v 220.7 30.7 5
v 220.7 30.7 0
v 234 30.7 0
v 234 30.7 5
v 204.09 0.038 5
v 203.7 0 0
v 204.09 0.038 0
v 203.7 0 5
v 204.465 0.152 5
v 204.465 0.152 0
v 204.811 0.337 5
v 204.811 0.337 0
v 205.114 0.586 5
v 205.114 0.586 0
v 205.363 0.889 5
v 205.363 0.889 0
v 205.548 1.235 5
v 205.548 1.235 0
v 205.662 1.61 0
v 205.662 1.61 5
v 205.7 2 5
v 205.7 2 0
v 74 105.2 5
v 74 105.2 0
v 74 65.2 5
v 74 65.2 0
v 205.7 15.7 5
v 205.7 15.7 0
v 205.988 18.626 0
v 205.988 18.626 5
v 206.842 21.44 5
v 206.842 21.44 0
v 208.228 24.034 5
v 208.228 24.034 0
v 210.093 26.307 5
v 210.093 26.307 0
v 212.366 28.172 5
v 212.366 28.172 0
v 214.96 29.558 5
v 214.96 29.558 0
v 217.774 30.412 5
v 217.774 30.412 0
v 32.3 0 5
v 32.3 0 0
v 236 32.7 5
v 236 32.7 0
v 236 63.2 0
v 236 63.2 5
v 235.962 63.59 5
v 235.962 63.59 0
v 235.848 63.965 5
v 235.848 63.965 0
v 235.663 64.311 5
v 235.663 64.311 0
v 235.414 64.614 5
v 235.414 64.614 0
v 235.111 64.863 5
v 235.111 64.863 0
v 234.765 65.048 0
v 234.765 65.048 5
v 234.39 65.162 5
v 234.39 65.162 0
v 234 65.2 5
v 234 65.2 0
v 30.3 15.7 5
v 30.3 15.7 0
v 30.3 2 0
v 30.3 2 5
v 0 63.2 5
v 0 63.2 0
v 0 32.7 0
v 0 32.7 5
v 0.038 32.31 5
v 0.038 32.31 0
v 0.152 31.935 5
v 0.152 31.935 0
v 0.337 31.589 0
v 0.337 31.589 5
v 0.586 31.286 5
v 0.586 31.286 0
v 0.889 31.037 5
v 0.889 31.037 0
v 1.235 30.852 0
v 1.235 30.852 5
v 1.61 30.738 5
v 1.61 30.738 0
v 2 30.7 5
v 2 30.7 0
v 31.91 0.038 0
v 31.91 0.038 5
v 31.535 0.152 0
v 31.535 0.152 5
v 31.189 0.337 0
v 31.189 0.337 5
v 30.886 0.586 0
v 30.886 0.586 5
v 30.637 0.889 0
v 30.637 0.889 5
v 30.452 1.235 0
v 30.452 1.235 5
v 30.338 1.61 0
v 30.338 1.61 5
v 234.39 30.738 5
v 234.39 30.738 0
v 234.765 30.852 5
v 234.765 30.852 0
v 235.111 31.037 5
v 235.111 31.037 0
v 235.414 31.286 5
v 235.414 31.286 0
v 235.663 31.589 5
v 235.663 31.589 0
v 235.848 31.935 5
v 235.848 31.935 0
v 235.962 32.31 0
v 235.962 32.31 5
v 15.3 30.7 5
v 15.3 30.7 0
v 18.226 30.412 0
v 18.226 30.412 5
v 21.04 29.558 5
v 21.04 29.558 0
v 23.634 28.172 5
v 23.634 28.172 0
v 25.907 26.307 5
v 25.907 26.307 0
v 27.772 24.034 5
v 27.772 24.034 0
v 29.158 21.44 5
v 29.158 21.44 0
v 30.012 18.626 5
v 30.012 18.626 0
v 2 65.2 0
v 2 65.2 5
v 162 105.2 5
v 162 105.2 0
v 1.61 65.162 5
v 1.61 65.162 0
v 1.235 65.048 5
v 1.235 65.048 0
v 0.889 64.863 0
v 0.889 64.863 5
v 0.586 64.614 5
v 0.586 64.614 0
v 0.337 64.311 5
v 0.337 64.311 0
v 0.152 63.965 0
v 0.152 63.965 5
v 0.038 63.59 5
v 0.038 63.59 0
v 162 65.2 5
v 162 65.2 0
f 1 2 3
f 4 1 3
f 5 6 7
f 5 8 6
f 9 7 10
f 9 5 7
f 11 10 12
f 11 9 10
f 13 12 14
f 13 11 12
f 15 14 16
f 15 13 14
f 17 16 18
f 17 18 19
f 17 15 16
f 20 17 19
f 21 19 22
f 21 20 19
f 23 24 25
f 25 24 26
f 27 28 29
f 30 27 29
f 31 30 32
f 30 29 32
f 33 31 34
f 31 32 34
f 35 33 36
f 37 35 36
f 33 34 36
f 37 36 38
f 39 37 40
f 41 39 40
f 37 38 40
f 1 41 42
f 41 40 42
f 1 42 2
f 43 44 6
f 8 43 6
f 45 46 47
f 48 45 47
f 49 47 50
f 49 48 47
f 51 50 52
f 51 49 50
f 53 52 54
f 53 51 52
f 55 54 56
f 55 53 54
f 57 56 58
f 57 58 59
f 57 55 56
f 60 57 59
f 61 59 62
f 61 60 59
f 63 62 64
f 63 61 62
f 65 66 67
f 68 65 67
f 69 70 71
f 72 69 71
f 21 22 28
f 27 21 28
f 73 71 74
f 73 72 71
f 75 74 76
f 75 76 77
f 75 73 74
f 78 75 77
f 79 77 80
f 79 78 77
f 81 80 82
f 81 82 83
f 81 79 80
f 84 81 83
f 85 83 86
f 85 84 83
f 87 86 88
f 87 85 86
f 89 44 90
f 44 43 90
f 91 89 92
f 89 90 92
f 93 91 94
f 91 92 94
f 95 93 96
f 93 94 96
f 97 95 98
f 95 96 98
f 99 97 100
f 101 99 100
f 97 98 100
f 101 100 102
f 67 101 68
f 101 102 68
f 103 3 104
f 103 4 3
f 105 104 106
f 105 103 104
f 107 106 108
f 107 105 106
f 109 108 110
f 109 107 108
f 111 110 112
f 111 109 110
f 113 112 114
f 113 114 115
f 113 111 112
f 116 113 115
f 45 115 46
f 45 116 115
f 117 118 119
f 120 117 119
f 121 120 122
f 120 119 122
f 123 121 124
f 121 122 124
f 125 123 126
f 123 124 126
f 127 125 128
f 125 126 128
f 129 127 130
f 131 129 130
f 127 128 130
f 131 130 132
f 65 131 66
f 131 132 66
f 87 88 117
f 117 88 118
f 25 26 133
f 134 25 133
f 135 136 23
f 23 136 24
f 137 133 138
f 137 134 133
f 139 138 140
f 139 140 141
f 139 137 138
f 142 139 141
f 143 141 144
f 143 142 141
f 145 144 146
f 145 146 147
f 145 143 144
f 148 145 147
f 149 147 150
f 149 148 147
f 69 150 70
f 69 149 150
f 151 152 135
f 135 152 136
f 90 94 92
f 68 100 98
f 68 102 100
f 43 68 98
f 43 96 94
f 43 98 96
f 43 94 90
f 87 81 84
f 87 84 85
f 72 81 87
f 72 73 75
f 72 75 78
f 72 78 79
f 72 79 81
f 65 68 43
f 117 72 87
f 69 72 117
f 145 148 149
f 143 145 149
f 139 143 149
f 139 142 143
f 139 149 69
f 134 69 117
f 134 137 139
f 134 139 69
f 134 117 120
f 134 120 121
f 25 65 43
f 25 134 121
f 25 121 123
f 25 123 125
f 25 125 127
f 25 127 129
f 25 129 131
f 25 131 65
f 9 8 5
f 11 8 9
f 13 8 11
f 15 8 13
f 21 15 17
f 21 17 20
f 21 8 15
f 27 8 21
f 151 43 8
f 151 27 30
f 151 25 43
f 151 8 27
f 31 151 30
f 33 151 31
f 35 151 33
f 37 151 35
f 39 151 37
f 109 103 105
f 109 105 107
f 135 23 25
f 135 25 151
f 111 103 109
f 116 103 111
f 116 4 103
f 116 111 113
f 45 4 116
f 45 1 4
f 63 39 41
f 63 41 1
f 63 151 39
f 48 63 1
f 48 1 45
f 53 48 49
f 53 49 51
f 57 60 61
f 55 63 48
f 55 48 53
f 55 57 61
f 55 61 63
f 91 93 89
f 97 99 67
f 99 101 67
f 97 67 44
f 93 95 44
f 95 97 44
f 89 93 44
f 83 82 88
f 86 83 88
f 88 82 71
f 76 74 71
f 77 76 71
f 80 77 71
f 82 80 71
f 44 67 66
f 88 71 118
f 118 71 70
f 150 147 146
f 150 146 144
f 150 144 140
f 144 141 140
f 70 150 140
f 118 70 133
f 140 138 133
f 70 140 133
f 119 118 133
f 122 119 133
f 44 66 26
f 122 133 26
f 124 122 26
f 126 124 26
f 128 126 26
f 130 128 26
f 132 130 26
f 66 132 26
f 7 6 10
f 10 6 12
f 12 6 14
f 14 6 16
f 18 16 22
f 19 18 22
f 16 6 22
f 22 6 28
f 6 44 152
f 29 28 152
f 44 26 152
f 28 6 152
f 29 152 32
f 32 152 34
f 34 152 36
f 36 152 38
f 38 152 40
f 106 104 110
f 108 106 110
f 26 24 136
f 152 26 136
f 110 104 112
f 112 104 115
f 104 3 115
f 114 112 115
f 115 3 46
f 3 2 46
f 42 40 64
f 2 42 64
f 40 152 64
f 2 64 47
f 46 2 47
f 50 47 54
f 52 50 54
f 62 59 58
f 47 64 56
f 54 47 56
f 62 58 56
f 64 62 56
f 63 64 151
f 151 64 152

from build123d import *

# Parameters (mm, degrees)
BOSS_EXTRU_1_DEPTH = 5
CONG_1_R           = 2


with BuildPart() as part:
    # Esquisse1 → Boss.-Extru.1 (new body)
    with BuildSketch(Plane.XY):
        Polygon((30.3, 15.7), (30.3, 0), (205.7, 0), (205.7, 15.7), (205.7, 30.7), (220.7, 30.7), (236, 30.7), (236, 65.2), (162, 65.2), (162, 105.2), (74, 105.2), (74, 65.2), (0, 65.2), (0, 30.7), (15.3, 30.7), (30.3, 30.7), align=None)
        with BuildLine():
            ThreePointArc((15.3, 30.7), (25.906601718, 26.306601718), (30.3, 15.7))
            Line((30.3, 15.7), (30.3, 30.7))
            Line((30.3, 30.7), (15.3, 30.7))
        make_face()
        with BuildLine():
            Line((205.7, 30.7), (205.7, 15.7))
            ThreePointArc((205.7, 15.7), (210.093398282, 26.306601718), (220.7, 30.7))
            Line((220.7, 30.7), (205.7, 30.7))
        make_face()
    extrude(amount=BOSS_EXTRU_1_DEPTH)

    # Congé1
    cong_1_edges = [part.edges().sort_by_distance(p)[0] for p in [
        (205.7, 0, 2.5),
        (30.3, 0, 2.5),
        (0, 30.7, 2.5),
        (0, 65.2, 2.5),
        (236, 65.2, 2.5),
        (236, 30.7, 2.5),
    ]]
    fillet(cong_1_edges, radius=CONG_1_R)


solid = part.part
